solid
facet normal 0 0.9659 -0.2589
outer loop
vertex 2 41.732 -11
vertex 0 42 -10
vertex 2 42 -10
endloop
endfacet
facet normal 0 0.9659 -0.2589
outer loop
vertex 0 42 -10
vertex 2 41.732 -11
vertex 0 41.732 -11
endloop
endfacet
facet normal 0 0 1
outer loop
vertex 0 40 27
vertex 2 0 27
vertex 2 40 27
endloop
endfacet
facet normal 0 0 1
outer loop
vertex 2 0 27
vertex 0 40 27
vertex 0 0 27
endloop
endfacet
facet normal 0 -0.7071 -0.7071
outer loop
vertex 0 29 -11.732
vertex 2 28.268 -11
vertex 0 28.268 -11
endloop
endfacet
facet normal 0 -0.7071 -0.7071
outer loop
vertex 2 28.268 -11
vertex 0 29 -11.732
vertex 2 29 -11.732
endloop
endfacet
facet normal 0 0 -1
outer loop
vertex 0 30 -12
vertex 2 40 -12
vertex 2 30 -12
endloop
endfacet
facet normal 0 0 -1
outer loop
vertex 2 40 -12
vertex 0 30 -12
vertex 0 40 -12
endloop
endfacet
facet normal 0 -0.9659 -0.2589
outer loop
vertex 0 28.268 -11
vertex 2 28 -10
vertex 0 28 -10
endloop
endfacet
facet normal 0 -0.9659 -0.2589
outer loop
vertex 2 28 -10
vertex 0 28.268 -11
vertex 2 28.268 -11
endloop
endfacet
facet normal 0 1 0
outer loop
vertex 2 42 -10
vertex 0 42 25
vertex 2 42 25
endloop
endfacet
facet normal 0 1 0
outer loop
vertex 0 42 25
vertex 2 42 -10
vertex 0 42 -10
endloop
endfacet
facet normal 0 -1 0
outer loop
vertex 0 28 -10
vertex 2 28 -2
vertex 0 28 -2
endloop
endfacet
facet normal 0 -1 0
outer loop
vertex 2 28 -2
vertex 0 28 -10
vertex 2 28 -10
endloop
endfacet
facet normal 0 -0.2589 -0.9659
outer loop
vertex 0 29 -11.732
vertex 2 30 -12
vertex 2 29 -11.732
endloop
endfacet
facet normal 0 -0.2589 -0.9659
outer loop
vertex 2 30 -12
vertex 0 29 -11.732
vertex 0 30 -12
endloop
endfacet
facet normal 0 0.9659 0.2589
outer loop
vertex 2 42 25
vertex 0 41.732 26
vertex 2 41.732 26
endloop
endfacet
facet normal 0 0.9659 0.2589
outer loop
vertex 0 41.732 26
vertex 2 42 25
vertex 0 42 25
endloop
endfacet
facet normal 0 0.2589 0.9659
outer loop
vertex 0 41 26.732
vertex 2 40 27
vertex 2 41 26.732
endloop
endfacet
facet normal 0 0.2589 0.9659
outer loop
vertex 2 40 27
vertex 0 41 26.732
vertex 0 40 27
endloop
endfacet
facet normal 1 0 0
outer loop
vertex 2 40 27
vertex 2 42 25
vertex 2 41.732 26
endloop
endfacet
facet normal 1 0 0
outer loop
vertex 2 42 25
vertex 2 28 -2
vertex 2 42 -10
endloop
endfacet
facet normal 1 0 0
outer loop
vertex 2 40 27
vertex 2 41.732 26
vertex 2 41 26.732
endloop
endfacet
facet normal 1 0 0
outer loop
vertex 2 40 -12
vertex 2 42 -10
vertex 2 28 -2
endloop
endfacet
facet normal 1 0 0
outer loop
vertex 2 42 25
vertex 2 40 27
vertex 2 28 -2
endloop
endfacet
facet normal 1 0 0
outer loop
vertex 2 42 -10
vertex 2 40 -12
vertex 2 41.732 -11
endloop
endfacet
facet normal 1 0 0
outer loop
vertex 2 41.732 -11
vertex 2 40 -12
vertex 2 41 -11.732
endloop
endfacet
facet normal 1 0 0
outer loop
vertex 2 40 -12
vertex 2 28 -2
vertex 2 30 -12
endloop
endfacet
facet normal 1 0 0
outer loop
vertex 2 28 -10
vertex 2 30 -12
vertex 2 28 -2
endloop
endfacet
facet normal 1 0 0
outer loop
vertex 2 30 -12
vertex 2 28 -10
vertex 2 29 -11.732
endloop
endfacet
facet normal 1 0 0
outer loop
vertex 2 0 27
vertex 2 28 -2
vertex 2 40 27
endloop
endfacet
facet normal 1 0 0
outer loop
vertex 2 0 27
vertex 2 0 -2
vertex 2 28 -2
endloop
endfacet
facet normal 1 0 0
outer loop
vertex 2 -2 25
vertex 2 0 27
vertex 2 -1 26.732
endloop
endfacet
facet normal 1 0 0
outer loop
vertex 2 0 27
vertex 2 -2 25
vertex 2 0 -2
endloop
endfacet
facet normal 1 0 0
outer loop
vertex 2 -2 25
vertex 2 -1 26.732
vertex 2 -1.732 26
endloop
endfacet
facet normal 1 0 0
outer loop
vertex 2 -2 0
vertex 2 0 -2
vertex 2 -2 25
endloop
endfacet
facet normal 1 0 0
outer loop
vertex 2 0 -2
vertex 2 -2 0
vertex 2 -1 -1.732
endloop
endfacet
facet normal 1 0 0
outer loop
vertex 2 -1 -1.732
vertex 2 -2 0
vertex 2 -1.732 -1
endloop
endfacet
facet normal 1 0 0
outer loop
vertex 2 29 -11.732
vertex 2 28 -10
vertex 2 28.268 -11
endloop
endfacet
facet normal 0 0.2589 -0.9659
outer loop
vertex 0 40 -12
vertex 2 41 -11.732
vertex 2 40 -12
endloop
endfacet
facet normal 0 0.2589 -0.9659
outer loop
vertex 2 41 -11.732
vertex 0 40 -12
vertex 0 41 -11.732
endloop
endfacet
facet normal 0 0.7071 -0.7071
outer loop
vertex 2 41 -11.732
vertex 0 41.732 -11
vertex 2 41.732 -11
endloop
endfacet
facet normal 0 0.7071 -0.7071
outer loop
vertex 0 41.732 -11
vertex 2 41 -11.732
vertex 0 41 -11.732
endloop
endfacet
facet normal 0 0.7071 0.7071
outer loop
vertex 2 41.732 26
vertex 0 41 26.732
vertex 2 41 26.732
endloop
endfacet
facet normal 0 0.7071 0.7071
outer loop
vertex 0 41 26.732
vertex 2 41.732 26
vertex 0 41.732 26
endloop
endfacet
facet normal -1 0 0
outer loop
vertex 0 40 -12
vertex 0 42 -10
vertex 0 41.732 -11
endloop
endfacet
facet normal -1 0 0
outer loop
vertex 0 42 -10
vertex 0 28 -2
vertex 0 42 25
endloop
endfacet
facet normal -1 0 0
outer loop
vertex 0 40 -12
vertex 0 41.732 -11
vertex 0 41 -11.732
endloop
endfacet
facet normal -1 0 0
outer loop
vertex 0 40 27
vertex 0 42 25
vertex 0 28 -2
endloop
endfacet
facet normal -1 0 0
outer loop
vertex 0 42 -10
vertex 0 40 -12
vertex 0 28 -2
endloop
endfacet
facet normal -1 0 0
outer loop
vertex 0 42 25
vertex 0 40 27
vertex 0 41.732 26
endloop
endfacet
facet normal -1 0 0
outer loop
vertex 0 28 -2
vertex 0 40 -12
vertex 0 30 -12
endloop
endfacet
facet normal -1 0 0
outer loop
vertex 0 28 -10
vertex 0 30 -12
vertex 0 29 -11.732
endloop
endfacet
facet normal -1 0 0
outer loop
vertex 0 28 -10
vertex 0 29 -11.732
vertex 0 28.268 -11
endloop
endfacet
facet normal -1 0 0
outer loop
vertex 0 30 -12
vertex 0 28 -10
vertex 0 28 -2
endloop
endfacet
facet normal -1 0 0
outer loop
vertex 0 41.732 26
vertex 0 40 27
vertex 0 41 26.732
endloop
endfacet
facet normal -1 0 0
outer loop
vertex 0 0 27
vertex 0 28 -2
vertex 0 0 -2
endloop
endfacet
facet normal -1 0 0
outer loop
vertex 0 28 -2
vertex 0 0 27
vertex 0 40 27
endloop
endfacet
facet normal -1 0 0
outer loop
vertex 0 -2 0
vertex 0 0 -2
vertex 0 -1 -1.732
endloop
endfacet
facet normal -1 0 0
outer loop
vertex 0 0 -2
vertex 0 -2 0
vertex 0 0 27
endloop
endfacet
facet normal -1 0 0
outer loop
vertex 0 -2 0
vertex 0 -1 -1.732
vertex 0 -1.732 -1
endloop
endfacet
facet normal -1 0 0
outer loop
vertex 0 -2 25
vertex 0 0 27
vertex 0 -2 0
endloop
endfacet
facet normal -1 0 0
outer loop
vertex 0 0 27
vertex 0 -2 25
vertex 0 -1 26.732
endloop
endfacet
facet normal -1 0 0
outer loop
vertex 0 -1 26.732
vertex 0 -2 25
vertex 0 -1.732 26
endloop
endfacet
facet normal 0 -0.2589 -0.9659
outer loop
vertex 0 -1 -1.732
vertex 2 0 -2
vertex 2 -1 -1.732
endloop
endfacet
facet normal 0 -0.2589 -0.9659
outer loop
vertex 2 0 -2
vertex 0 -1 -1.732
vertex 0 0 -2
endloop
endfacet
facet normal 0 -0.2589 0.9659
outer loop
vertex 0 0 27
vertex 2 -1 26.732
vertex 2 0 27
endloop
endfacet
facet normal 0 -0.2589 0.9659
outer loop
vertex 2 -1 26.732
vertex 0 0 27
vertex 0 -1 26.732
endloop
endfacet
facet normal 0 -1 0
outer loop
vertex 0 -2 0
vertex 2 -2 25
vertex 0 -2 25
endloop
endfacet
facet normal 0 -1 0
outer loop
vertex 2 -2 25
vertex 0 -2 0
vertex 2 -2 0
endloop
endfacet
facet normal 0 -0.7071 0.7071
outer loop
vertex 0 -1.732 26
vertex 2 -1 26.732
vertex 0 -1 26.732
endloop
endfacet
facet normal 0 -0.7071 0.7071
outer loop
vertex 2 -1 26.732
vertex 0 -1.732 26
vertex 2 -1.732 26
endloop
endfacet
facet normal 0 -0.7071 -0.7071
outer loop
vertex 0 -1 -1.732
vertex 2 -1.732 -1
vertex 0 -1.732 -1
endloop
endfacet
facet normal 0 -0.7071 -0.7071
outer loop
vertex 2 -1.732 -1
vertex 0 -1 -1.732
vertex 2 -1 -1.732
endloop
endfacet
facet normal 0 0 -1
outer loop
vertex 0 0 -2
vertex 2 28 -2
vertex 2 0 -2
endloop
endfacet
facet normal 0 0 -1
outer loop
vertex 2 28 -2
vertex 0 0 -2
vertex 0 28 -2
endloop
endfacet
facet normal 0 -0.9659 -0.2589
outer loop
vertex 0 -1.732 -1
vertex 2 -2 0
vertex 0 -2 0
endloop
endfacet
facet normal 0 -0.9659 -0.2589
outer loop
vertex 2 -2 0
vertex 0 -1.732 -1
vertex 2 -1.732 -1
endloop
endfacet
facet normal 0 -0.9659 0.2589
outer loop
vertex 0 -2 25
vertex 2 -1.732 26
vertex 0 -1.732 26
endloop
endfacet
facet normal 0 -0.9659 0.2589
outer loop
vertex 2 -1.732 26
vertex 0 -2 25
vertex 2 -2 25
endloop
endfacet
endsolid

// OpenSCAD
$fn = 12;
chosen = 3;
max_ = 4;
minkowski() {
union() {
cube([1,10*max_,25]);
if(chosen!= -1) {
translate([0, 10*chosen, -10]) {
cube([1, 10, 10]);
}
}
}
rotate([0, 90, 0]) {
cylinder(r=2,h=1);
}
}
